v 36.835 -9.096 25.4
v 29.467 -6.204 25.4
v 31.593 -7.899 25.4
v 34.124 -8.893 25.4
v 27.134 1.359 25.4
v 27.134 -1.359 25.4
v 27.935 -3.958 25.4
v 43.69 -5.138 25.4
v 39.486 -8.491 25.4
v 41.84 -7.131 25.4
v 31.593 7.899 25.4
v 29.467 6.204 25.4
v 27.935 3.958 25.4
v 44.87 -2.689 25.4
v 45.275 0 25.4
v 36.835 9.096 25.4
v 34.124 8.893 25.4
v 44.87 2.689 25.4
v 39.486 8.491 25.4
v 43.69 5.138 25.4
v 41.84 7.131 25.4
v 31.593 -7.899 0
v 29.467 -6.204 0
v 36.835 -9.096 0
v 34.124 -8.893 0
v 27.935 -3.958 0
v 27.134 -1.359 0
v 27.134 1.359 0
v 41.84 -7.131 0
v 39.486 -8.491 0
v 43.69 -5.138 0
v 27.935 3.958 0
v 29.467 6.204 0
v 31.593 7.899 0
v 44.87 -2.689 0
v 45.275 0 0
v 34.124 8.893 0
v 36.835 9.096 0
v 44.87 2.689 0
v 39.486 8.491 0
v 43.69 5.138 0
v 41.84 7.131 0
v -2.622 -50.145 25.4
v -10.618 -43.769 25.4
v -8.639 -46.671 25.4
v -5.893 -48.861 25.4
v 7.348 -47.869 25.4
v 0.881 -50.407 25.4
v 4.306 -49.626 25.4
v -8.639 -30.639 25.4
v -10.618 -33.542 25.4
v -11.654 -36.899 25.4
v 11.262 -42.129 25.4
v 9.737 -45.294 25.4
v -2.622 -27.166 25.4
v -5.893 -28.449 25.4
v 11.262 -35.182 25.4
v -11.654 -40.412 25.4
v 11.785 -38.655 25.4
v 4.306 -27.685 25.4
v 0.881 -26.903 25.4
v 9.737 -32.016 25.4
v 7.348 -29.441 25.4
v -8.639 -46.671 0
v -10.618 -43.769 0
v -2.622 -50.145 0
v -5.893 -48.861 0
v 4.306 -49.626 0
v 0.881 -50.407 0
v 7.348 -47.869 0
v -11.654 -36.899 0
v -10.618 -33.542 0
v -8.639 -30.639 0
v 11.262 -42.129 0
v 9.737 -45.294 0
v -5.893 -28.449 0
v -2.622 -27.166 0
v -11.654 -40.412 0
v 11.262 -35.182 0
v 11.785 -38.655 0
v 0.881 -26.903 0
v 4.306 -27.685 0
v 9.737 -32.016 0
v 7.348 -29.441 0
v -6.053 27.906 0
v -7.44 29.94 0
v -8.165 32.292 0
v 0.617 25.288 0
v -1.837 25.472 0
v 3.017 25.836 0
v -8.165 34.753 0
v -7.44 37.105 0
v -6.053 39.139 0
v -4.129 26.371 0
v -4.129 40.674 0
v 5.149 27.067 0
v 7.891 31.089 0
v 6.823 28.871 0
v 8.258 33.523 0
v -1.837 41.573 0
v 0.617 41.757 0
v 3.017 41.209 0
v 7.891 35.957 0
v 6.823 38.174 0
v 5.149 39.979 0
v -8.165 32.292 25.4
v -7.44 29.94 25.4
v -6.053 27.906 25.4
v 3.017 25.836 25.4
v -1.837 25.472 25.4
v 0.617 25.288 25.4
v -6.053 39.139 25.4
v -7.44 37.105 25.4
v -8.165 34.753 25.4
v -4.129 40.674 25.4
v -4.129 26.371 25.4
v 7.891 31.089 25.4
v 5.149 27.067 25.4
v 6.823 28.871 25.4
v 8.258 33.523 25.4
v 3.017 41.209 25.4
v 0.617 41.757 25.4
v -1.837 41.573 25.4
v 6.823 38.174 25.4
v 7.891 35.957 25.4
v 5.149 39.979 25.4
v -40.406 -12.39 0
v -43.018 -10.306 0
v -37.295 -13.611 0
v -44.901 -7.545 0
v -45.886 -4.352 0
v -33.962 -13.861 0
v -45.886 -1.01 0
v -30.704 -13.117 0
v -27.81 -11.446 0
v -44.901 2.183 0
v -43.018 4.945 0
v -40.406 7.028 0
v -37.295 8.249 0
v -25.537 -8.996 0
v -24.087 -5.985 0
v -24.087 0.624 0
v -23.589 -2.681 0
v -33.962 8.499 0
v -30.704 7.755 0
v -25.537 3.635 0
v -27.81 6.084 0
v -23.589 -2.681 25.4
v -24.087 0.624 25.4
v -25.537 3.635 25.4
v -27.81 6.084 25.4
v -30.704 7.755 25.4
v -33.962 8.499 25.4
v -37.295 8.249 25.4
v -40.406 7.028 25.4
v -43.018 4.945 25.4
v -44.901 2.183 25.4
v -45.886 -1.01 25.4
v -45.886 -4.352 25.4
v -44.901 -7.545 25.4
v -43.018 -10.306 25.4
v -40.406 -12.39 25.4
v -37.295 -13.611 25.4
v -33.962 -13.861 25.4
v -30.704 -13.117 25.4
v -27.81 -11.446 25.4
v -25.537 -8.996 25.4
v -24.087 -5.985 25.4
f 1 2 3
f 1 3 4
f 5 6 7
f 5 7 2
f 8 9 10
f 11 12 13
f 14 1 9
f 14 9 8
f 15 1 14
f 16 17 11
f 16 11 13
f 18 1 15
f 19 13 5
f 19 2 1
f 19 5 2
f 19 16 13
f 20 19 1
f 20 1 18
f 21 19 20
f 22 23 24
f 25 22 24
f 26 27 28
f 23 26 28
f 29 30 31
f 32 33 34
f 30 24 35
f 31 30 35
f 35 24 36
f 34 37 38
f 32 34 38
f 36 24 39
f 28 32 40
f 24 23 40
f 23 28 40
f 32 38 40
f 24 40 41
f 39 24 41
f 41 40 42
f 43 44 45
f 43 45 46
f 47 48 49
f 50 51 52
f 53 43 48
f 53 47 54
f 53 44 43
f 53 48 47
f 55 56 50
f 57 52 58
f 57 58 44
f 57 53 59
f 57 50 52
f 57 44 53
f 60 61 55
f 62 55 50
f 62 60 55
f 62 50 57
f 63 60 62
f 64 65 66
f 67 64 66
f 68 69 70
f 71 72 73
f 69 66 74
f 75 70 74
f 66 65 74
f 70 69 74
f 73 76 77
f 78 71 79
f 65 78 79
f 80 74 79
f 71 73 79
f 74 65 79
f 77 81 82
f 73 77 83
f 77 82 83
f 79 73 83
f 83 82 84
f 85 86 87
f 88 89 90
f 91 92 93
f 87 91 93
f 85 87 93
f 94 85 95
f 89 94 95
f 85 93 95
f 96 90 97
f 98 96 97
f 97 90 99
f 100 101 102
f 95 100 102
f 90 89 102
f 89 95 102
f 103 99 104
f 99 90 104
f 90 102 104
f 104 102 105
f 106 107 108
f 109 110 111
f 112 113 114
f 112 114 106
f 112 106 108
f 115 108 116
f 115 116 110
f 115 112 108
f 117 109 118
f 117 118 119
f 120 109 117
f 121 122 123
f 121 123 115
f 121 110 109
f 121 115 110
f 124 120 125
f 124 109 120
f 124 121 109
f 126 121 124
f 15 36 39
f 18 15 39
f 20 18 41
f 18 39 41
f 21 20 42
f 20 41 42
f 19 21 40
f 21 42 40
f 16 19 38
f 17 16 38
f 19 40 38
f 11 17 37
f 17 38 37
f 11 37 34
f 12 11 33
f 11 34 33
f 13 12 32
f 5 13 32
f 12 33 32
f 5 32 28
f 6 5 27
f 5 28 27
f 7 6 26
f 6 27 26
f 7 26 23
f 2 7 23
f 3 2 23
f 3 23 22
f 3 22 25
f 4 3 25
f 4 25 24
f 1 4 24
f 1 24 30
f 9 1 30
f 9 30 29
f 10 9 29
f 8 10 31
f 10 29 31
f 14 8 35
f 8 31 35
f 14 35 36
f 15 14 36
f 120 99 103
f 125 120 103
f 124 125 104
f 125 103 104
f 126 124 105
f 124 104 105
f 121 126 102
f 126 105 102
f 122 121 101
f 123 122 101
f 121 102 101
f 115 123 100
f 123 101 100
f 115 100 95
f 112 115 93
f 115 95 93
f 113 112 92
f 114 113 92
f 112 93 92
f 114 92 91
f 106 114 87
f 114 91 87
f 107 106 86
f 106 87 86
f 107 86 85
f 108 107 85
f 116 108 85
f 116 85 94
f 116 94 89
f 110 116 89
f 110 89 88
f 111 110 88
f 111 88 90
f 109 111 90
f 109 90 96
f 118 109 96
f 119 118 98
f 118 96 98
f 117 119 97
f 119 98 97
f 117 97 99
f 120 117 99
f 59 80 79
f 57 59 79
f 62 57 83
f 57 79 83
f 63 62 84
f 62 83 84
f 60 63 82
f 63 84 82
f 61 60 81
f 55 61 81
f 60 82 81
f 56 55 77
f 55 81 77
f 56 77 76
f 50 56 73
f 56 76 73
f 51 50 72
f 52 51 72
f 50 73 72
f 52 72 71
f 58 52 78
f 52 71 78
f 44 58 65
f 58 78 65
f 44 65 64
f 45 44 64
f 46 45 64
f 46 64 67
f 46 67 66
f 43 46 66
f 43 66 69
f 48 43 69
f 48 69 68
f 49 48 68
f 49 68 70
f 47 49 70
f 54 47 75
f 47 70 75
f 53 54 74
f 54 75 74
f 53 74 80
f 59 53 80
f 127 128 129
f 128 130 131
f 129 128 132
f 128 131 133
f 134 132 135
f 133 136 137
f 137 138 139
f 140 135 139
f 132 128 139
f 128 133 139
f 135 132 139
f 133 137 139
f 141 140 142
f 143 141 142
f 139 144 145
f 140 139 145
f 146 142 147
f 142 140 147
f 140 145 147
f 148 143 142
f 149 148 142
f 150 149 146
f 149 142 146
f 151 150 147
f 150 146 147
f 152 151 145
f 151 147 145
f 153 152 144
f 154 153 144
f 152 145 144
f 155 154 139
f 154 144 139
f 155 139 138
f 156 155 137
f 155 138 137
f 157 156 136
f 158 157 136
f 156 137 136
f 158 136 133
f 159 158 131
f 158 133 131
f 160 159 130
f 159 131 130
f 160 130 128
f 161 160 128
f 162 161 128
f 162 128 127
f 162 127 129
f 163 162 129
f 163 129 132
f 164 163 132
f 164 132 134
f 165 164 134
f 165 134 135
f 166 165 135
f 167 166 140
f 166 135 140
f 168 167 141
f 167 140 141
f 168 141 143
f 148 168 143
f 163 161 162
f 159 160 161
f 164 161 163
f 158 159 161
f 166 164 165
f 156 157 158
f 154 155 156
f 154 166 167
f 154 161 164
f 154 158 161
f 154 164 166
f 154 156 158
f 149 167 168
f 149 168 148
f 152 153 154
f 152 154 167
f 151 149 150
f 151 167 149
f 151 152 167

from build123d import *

# Parameters (mm, degrees)
F2_R     = 9.1214460024
F3_DEPTH = 25.4
F4_R     = 11.2110594619
F5_DEPTH = 25.4
F6_R     = 11.7851409997
F7_DEPTH = 25.4
F6_R_2   = 8.2576202632


# Not quite as in the source:
# - the program builds the solid bodies; features that only make, move or delete a surface that nothing else refers to are left out


with BuildPart() as f3:
    # F2 (on Top) → F3 (new body)
    with BuildSketch(Plane.XY):
        with Locations((36.1533612013, 0)):
            Circle(F2_R)
    extrude(amount=F3_DEPTH)


with BuildPart() as f5:
    # F4 (on Top) → F5 (new body)
    with BuildSketch(Plane.XY):
        with Locations((-34.8000079393, -2.6808977127)):
            Circle(F4_R)
    extrude(amount=F5_DEPTH)


with BuildPart() as f7:
    # F6 (on Top) → F7 (new body)
    with BuildSketch(Plane.XY):
        with Locations((0, -38.6552363634)):
            Circle(F6_R)
    extrude(amount=F7_DEPTH)


with BuildPart() as f7b:
    # F6 (on Top) → F7, piece 2 (new body)
    with BuildSketch(Plane.XY):
        with Locations((0, 33.5225760937)):
            Circle(F6_R_2)
    extrude(amount=F7_DEPTH)


solid = Compound([f3.part, f5.part, f7.part, f7b.part])
